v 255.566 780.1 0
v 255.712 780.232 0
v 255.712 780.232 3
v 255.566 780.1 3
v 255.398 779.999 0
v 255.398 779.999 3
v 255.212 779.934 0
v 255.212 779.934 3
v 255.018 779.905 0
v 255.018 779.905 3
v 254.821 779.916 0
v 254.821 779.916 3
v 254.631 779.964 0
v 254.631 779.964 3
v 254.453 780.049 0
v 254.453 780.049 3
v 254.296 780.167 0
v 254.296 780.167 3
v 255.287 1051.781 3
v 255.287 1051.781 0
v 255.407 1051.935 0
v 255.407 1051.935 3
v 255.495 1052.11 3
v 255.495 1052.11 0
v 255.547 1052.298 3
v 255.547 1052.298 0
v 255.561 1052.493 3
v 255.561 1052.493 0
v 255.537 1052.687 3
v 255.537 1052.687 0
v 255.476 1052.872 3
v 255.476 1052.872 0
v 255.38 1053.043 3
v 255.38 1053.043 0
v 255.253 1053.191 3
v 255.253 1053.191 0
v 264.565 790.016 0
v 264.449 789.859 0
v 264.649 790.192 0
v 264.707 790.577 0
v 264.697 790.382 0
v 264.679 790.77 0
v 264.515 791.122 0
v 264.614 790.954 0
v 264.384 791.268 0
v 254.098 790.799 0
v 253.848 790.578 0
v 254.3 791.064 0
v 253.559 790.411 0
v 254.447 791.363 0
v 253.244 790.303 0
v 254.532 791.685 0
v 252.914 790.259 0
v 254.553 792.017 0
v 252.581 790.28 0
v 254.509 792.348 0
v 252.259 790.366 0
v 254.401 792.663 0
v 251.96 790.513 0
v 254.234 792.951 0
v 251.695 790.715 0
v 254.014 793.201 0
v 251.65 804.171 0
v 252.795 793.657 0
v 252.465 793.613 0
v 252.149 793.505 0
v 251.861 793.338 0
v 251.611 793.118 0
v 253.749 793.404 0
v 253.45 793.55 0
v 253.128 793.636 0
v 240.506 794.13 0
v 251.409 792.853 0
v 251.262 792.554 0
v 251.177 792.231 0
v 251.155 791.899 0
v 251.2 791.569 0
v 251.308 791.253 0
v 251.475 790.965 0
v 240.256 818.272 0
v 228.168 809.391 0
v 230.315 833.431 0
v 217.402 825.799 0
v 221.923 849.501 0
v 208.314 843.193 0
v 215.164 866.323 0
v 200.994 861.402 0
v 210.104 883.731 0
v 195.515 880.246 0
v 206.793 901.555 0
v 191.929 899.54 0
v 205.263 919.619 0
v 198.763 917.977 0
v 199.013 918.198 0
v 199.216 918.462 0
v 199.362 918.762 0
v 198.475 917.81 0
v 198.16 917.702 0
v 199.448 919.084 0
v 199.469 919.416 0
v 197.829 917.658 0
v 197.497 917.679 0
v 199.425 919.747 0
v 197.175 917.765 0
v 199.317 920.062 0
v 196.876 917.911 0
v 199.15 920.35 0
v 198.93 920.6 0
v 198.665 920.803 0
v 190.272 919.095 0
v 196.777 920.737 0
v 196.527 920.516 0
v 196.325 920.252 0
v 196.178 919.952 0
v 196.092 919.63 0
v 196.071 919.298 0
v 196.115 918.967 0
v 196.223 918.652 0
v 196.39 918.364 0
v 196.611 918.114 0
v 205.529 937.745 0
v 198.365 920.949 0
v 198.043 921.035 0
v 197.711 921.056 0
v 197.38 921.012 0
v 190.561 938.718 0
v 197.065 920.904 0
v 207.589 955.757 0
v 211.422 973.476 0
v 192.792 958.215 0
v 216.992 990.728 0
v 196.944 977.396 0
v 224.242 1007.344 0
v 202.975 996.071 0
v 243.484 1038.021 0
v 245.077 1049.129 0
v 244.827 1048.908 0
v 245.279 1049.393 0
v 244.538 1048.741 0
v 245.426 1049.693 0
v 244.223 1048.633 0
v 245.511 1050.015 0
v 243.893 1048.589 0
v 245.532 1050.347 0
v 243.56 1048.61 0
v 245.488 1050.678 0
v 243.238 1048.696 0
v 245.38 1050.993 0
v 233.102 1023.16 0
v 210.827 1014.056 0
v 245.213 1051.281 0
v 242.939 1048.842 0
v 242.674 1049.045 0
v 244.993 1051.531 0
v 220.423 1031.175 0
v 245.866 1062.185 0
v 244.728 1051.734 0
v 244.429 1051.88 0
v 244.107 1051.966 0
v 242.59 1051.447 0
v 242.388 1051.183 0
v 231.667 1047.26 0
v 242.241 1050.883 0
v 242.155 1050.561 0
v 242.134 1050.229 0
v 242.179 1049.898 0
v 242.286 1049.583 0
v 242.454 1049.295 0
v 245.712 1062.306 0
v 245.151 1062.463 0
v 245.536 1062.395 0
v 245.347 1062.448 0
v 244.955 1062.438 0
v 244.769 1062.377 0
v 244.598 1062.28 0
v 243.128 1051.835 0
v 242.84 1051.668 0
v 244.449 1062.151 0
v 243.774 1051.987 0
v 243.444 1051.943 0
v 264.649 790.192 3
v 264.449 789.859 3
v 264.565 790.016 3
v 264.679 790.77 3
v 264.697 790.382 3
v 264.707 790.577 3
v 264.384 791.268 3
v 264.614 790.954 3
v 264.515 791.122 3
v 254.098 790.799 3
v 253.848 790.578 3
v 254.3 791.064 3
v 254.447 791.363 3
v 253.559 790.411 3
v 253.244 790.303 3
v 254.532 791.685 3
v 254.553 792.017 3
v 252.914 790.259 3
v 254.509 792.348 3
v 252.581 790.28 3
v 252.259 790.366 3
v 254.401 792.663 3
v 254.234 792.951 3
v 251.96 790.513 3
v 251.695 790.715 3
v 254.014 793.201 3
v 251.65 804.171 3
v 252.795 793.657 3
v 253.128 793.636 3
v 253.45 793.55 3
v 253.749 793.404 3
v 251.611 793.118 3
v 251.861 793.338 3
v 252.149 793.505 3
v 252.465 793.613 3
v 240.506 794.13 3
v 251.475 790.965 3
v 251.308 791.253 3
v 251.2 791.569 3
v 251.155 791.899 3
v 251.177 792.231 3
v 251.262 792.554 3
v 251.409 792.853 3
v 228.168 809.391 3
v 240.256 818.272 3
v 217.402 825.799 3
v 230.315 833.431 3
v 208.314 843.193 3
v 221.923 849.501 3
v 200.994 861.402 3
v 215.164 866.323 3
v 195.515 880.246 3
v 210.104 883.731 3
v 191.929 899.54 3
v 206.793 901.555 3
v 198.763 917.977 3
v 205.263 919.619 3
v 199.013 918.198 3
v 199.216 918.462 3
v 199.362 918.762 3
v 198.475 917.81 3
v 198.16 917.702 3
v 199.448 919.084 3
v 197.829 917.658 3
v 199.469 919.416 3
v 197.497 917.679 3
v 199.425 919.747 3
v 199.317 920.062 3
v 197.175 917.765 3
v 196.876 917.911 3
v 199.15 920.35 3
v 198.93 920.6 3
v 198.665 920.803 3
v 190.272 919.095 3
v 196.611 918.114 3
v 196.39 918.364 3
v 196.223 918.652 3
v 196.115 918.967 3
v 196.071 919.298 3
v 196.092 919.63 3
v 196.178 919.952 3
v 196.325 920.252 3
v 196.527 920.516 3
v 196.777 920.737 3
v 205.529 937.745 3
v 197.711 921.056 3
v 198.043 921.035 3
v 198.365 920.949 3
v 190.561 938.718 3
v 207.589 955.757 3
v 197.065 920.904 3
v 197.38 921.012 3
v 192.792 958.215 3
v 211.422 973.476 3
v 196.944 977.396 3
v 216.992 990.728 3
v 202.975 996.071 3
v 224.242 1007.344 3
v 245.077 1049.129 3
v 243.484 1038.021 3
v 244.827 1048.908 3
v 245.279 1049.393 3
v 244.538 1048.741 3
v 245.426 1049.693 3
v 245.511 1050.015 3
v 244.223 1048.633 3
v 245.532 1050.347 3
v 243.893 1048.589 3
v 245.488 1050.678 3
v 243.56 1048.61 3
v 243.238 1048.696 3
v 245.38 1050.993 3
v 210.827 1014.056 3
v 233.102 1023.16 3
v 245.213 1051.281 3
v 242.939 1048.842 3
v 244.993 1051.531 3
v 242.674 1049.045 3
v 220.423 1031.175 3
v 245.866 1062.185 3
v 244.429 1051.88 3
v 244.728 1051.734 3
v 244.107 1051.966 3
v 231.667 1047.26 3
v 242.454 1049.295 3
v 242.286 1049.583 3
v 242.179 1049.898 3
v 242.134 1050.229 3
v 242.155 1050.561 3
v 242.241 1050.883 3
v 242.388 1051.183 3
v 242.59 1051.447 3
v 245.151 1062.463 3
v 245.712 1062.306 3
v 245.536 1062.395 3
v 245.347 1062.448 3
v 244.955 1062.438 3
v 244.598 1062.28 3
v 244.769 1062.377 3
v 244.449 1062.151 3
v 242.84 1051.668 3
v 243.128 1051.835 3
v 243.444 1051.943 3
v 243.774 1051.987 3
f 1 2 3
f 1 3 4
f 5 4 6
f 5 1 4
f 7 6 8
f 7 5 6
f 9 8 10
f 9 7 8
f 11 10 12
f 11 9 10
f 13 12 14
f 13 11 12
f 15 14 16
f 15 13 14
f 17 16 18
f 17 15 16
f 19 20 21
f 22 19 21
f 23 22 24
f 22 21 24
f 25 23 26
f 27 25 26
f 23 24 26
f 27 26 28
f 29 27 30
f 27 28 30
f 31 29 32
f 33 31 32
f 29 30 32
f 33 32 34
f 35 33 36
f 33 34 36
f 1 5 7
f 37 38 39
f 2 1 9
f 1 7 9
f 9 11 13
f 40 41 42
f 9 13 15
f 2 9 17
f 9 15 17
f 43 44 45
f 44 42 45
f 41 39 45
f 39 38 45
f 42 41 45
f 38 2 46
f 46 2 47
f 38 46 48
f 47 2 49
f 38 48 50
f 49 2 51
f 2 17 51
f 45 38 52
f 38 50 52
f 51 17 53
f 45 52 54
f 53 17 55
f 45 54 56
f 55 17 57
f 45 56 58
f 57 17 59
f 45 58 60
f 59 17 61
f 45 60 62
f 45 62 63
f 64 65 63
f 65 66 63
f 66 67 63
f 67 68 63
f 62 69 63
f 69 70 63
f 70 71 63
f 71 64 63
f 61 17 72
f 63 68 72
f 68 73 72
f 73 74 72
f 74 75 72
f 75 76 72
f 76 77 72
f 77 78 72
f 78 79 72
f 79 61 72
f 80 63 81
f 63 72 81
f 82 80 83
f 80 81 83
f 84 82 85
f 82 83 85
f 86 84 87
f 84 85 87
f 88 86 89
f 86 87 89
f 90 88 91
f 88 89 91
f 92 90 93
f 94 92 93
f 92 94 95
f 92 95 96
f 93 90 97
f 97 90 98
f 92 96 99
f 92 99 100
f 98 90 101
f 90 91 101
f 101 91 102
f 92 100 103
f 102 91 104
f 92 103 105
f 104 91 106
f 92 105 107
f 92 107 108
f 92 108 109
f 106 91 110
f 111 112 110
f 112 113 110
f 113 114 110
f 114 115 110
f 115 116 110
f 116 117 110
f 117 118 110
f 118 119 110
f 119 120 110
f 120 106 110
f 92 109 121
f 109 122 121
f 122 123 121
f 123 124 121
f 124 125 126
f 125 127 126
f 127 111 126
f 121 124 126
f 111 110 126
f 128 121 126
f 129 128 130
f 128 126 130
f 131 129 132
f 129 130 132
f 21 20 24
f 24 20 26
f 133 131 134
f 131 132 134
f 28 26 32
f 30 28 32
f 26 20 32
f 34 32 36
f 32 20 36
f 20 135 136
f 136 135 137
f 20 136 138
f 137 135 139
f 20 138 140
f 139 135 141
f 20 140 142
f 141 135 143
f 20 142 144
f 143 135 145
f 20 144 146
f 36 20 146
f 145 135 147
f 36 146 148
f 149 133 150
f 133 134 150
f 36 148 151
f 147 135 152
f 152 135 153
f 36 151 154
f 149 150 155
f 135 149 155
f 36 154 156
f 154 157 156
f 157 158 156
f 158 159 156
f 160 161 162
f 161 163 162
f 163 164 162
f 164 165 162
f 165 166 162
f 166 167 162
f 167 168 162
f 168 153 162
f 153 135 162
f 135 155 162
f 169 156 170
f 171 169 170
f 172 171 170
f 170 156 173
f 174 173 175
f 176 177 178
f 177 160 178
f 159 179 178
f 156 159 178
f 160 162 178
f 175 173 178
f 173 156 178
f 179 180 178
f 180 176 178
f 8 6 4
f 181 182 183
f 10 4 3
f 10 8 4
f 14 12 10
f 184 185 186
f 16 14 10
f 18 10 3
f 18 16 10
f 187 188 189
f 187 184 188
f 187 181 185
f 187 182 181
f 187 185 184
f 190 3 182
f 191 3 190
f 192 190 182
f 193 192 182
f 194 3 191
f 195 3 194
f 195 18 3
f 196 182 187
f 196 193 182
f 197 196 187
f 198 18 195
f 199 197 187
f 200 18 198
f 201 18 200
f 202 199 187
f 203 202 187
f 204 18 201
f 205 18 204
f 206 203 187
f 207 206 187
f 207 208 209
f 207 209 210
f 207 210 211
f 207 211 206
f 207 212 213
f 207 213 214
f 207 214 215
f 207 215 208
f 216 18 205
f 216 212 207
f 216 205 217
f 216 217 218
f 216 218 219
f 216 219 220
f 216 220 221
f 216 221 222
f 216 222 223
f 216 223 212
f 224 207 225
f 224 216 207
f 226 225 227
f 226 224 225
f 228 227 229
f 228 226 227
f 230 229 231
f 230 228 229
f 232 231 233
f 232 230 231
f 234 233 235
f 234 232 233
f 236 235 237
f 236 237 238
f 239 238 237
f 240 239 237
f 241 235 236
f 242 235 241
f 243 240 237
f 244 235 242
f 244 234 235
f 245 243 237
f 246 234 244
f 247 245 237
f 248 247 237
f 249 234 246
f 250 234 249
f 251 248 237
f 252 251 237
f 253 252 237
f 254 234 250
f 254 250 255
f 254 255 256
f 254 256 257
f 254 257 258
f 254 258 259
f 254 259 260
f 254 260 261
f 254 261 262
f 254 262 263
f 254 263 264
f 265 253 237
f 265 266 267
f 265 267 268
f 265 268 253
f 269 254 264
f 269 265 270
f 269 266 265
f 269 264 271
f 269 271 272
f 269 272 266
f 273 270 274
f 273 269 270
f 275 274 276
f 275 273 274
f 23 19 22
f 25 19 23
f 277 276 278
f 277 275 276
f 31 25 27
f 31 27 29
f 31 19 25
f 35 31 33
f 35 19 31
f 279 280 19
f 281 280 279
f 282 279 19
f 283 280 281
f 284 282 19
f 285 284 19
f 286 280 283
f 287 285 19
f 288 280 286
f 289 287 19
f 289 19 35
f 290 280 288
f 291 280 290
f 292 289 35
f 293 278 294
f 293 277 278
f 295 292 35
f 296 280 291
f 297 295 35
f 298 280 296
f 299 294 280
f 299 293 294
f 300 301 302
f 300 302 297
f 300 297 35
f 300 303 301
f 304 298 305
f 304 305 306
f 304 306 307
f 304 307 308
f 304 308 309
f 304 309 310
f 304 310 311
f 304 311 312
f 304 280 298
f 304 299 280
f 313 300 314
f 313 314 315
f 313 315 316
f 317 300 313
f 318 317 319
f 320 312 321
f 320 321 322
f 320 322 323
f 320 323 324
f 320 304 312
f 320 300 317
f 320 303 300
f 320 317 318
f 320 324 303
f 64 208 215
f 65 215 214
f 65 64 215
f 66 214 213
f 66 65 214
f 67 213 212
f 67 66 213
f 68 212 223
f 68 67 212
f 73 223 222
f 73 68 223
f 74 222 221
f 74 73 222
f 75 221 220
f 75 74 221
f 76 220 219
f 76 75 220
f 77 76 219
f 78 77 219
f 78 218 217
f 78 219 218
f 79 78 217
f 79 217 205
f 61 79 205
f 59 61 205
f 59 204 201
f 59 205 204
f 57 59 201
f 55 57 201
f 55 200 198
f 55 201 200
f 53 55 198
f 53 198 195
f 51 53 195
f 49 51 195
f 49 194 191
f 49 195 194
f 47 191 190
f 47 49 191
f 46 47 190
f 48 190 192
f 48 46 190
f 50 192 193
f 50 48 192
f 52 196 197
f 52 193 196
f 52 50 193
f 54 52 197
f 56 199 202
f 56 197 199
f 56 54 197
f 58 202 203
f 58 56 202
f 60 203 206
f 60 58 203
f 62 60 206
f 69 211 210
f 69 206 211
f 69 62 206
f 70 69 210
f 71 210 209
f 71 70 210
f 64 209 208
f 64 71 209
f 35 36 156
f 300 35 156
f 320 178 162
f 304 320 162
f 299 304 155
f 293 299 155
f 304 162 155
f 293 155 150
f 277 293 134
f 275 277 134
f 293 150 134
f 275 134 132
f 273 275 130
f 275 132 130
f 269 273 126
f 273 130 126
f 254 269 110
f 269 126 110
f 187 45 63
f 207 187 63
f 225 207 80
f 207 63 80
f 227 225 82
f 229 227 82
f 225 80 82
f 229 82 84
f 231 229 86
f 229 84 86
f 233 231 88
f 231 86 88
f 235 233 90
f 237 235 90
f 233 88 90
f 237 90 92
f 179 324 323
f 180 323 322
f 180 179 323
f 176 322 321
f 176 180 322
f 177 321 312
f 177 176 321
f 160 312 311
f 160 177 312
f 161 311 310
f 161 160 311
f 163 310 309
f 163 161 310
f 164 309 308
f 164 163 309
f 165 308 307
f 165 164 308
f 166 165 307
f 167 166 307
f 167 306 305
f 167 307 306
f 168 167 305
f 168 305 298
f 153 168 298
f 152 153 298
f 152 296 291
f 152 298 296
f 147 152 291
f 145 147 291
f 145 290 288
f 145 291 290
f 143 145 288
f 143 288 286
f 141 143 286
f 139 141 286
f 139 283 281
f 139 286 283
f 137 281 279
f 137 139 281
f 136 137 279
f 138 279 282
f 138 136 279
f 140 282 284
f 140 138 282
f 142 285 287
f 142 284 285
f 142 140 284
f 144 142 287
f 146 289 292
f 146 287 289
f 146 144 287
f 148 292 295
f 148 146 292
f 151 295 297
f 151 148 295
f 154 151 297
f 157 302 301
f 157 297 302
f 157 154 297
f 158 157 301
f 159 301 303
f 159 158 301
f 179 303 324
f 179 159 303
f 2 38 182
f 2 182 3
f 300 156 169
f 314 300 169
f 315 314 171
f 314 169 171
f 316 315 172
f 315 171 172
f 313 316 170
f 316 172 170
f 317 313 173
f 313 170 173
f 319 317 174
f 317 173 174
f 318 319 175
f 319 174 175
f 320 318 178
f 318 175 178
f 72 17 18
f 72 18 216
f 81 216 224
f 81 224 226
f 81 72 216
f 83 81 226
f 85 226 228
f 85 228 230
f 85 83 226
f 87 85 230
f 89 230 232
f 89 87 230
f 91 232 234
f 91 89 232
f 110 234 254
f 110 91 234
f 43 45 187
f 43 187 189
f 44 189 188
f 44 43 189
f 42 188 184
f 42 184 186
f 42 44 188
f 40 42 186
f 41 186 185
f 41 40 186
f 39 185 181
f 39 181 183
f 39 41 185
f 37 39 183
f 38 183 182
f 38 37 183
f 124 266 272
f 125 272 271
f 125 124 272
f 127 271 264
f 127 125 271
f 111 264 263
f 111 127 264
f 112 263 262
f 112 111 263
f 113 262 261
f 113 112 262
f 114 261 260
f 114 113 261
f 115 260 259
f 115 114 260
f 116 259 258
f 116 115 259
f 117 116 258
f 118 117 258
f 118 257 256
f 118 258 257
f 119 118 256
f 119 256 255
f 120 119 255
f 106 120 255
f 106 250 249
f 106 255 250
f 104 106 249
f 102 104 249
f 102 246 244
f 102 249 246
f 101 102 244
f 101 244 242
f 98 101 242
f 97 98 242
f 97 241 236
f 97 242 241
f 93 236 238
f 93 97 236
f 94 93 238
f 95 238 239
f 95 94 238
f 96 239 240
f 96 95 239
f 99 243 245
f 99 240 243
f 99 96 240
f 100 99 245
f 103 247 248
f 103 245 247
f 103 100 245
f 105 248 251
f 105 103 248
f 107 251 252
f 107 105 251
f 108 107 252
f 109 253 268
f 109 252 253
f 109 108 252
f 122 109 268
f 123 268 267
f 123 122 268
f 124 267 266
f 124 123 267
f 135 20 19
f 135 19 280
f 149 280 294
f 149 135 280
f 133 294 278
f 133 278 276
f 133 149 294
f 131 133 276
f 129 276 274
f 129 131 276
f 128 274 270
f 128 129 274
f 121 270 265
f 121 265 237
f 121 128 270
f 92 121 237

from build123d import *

# Parameters (mm, degrees)
PAD015_DEPTH                        = 3
SKETCH054_R                         = 1.7
POCKET018_DEPTH                     = 0.001
POCKET018_DEPTH_BACK                = 3.001
BODY001003005003004_PLACEMENT_ANGLE = 60
CLONE022_PLACEMENT_ANGLE            = 32


with BuildPart() as part:
    # Sketch053 → Pad015 (new body)
    with BuildSketch(Plane.XY):
        with BuildLine():
            Line((0, 182.848457), (0, 197.848457))
            ThreePointArc((141.077868, 138.712102), (76.485413, 182.466418), (0, 197.848457))
            ThreePointArc((141.062279, 137.294387), (141.364747, 138.000004), (141.077868, 138.712102))
            Line((131.746186, 128.227134), (141.062279, 137.294387))
            ThreePointArc((130.335906, 128.242388), (131.037899, 127.943805), (131.746186, 128.227134))
            ThreePointArc((130.335906, 128.242388), (70.656336, 168.64531), (0, 182.848457))
        make_face()
    pad015 = extrude(amount=PAD015_DEPTH)

    # Mirrored020: Pad015 across Sketch053 V_Axis
    add(pad015.mirror(Plane(origin=(0, 0, 0), x_dir=(0, 0, 1), z_dir=(1, 0, 0))))

    # Sketch054 → Pocket018 (cut, two sides)
    with BuildSketch(Plane.XY) as pocket018_sk:
        with Locations((129.243686, 139.741203)):
            Circle(SKETCH054_R)
        with Locations((0, 190.345828)):
            Circle(SKETCH054_R)
        with Locations((-129.243686, 139.741203)):
            Circle(SKETCH054_R)
    extrude(amount=-POCKET018_DEPTH, mode=Mode.SUBTRACT)
    extrude(pocket018_sk.sketch, amount=POCKET018_DEPTH_BACK, mode=Mode.SUBTRACT)


with BuildPart() as part_1:
    # Body001003005003004 placement: moved
    add(part.part.rotate(Axis((0, 0, 0), (0, 0, 1)), BODY001003005003004_PLACEMENT_ANGLE))


with BuildPart() as part_2:
    # Clone022 placement: moved
    add(part_1.part.moved(Location((388, 926, 0))).rotate(Axis((388, 926, 0), (0, 0, 1)), CLONE022_PLACEMENT_ANGLE))


solid = part_2.part
